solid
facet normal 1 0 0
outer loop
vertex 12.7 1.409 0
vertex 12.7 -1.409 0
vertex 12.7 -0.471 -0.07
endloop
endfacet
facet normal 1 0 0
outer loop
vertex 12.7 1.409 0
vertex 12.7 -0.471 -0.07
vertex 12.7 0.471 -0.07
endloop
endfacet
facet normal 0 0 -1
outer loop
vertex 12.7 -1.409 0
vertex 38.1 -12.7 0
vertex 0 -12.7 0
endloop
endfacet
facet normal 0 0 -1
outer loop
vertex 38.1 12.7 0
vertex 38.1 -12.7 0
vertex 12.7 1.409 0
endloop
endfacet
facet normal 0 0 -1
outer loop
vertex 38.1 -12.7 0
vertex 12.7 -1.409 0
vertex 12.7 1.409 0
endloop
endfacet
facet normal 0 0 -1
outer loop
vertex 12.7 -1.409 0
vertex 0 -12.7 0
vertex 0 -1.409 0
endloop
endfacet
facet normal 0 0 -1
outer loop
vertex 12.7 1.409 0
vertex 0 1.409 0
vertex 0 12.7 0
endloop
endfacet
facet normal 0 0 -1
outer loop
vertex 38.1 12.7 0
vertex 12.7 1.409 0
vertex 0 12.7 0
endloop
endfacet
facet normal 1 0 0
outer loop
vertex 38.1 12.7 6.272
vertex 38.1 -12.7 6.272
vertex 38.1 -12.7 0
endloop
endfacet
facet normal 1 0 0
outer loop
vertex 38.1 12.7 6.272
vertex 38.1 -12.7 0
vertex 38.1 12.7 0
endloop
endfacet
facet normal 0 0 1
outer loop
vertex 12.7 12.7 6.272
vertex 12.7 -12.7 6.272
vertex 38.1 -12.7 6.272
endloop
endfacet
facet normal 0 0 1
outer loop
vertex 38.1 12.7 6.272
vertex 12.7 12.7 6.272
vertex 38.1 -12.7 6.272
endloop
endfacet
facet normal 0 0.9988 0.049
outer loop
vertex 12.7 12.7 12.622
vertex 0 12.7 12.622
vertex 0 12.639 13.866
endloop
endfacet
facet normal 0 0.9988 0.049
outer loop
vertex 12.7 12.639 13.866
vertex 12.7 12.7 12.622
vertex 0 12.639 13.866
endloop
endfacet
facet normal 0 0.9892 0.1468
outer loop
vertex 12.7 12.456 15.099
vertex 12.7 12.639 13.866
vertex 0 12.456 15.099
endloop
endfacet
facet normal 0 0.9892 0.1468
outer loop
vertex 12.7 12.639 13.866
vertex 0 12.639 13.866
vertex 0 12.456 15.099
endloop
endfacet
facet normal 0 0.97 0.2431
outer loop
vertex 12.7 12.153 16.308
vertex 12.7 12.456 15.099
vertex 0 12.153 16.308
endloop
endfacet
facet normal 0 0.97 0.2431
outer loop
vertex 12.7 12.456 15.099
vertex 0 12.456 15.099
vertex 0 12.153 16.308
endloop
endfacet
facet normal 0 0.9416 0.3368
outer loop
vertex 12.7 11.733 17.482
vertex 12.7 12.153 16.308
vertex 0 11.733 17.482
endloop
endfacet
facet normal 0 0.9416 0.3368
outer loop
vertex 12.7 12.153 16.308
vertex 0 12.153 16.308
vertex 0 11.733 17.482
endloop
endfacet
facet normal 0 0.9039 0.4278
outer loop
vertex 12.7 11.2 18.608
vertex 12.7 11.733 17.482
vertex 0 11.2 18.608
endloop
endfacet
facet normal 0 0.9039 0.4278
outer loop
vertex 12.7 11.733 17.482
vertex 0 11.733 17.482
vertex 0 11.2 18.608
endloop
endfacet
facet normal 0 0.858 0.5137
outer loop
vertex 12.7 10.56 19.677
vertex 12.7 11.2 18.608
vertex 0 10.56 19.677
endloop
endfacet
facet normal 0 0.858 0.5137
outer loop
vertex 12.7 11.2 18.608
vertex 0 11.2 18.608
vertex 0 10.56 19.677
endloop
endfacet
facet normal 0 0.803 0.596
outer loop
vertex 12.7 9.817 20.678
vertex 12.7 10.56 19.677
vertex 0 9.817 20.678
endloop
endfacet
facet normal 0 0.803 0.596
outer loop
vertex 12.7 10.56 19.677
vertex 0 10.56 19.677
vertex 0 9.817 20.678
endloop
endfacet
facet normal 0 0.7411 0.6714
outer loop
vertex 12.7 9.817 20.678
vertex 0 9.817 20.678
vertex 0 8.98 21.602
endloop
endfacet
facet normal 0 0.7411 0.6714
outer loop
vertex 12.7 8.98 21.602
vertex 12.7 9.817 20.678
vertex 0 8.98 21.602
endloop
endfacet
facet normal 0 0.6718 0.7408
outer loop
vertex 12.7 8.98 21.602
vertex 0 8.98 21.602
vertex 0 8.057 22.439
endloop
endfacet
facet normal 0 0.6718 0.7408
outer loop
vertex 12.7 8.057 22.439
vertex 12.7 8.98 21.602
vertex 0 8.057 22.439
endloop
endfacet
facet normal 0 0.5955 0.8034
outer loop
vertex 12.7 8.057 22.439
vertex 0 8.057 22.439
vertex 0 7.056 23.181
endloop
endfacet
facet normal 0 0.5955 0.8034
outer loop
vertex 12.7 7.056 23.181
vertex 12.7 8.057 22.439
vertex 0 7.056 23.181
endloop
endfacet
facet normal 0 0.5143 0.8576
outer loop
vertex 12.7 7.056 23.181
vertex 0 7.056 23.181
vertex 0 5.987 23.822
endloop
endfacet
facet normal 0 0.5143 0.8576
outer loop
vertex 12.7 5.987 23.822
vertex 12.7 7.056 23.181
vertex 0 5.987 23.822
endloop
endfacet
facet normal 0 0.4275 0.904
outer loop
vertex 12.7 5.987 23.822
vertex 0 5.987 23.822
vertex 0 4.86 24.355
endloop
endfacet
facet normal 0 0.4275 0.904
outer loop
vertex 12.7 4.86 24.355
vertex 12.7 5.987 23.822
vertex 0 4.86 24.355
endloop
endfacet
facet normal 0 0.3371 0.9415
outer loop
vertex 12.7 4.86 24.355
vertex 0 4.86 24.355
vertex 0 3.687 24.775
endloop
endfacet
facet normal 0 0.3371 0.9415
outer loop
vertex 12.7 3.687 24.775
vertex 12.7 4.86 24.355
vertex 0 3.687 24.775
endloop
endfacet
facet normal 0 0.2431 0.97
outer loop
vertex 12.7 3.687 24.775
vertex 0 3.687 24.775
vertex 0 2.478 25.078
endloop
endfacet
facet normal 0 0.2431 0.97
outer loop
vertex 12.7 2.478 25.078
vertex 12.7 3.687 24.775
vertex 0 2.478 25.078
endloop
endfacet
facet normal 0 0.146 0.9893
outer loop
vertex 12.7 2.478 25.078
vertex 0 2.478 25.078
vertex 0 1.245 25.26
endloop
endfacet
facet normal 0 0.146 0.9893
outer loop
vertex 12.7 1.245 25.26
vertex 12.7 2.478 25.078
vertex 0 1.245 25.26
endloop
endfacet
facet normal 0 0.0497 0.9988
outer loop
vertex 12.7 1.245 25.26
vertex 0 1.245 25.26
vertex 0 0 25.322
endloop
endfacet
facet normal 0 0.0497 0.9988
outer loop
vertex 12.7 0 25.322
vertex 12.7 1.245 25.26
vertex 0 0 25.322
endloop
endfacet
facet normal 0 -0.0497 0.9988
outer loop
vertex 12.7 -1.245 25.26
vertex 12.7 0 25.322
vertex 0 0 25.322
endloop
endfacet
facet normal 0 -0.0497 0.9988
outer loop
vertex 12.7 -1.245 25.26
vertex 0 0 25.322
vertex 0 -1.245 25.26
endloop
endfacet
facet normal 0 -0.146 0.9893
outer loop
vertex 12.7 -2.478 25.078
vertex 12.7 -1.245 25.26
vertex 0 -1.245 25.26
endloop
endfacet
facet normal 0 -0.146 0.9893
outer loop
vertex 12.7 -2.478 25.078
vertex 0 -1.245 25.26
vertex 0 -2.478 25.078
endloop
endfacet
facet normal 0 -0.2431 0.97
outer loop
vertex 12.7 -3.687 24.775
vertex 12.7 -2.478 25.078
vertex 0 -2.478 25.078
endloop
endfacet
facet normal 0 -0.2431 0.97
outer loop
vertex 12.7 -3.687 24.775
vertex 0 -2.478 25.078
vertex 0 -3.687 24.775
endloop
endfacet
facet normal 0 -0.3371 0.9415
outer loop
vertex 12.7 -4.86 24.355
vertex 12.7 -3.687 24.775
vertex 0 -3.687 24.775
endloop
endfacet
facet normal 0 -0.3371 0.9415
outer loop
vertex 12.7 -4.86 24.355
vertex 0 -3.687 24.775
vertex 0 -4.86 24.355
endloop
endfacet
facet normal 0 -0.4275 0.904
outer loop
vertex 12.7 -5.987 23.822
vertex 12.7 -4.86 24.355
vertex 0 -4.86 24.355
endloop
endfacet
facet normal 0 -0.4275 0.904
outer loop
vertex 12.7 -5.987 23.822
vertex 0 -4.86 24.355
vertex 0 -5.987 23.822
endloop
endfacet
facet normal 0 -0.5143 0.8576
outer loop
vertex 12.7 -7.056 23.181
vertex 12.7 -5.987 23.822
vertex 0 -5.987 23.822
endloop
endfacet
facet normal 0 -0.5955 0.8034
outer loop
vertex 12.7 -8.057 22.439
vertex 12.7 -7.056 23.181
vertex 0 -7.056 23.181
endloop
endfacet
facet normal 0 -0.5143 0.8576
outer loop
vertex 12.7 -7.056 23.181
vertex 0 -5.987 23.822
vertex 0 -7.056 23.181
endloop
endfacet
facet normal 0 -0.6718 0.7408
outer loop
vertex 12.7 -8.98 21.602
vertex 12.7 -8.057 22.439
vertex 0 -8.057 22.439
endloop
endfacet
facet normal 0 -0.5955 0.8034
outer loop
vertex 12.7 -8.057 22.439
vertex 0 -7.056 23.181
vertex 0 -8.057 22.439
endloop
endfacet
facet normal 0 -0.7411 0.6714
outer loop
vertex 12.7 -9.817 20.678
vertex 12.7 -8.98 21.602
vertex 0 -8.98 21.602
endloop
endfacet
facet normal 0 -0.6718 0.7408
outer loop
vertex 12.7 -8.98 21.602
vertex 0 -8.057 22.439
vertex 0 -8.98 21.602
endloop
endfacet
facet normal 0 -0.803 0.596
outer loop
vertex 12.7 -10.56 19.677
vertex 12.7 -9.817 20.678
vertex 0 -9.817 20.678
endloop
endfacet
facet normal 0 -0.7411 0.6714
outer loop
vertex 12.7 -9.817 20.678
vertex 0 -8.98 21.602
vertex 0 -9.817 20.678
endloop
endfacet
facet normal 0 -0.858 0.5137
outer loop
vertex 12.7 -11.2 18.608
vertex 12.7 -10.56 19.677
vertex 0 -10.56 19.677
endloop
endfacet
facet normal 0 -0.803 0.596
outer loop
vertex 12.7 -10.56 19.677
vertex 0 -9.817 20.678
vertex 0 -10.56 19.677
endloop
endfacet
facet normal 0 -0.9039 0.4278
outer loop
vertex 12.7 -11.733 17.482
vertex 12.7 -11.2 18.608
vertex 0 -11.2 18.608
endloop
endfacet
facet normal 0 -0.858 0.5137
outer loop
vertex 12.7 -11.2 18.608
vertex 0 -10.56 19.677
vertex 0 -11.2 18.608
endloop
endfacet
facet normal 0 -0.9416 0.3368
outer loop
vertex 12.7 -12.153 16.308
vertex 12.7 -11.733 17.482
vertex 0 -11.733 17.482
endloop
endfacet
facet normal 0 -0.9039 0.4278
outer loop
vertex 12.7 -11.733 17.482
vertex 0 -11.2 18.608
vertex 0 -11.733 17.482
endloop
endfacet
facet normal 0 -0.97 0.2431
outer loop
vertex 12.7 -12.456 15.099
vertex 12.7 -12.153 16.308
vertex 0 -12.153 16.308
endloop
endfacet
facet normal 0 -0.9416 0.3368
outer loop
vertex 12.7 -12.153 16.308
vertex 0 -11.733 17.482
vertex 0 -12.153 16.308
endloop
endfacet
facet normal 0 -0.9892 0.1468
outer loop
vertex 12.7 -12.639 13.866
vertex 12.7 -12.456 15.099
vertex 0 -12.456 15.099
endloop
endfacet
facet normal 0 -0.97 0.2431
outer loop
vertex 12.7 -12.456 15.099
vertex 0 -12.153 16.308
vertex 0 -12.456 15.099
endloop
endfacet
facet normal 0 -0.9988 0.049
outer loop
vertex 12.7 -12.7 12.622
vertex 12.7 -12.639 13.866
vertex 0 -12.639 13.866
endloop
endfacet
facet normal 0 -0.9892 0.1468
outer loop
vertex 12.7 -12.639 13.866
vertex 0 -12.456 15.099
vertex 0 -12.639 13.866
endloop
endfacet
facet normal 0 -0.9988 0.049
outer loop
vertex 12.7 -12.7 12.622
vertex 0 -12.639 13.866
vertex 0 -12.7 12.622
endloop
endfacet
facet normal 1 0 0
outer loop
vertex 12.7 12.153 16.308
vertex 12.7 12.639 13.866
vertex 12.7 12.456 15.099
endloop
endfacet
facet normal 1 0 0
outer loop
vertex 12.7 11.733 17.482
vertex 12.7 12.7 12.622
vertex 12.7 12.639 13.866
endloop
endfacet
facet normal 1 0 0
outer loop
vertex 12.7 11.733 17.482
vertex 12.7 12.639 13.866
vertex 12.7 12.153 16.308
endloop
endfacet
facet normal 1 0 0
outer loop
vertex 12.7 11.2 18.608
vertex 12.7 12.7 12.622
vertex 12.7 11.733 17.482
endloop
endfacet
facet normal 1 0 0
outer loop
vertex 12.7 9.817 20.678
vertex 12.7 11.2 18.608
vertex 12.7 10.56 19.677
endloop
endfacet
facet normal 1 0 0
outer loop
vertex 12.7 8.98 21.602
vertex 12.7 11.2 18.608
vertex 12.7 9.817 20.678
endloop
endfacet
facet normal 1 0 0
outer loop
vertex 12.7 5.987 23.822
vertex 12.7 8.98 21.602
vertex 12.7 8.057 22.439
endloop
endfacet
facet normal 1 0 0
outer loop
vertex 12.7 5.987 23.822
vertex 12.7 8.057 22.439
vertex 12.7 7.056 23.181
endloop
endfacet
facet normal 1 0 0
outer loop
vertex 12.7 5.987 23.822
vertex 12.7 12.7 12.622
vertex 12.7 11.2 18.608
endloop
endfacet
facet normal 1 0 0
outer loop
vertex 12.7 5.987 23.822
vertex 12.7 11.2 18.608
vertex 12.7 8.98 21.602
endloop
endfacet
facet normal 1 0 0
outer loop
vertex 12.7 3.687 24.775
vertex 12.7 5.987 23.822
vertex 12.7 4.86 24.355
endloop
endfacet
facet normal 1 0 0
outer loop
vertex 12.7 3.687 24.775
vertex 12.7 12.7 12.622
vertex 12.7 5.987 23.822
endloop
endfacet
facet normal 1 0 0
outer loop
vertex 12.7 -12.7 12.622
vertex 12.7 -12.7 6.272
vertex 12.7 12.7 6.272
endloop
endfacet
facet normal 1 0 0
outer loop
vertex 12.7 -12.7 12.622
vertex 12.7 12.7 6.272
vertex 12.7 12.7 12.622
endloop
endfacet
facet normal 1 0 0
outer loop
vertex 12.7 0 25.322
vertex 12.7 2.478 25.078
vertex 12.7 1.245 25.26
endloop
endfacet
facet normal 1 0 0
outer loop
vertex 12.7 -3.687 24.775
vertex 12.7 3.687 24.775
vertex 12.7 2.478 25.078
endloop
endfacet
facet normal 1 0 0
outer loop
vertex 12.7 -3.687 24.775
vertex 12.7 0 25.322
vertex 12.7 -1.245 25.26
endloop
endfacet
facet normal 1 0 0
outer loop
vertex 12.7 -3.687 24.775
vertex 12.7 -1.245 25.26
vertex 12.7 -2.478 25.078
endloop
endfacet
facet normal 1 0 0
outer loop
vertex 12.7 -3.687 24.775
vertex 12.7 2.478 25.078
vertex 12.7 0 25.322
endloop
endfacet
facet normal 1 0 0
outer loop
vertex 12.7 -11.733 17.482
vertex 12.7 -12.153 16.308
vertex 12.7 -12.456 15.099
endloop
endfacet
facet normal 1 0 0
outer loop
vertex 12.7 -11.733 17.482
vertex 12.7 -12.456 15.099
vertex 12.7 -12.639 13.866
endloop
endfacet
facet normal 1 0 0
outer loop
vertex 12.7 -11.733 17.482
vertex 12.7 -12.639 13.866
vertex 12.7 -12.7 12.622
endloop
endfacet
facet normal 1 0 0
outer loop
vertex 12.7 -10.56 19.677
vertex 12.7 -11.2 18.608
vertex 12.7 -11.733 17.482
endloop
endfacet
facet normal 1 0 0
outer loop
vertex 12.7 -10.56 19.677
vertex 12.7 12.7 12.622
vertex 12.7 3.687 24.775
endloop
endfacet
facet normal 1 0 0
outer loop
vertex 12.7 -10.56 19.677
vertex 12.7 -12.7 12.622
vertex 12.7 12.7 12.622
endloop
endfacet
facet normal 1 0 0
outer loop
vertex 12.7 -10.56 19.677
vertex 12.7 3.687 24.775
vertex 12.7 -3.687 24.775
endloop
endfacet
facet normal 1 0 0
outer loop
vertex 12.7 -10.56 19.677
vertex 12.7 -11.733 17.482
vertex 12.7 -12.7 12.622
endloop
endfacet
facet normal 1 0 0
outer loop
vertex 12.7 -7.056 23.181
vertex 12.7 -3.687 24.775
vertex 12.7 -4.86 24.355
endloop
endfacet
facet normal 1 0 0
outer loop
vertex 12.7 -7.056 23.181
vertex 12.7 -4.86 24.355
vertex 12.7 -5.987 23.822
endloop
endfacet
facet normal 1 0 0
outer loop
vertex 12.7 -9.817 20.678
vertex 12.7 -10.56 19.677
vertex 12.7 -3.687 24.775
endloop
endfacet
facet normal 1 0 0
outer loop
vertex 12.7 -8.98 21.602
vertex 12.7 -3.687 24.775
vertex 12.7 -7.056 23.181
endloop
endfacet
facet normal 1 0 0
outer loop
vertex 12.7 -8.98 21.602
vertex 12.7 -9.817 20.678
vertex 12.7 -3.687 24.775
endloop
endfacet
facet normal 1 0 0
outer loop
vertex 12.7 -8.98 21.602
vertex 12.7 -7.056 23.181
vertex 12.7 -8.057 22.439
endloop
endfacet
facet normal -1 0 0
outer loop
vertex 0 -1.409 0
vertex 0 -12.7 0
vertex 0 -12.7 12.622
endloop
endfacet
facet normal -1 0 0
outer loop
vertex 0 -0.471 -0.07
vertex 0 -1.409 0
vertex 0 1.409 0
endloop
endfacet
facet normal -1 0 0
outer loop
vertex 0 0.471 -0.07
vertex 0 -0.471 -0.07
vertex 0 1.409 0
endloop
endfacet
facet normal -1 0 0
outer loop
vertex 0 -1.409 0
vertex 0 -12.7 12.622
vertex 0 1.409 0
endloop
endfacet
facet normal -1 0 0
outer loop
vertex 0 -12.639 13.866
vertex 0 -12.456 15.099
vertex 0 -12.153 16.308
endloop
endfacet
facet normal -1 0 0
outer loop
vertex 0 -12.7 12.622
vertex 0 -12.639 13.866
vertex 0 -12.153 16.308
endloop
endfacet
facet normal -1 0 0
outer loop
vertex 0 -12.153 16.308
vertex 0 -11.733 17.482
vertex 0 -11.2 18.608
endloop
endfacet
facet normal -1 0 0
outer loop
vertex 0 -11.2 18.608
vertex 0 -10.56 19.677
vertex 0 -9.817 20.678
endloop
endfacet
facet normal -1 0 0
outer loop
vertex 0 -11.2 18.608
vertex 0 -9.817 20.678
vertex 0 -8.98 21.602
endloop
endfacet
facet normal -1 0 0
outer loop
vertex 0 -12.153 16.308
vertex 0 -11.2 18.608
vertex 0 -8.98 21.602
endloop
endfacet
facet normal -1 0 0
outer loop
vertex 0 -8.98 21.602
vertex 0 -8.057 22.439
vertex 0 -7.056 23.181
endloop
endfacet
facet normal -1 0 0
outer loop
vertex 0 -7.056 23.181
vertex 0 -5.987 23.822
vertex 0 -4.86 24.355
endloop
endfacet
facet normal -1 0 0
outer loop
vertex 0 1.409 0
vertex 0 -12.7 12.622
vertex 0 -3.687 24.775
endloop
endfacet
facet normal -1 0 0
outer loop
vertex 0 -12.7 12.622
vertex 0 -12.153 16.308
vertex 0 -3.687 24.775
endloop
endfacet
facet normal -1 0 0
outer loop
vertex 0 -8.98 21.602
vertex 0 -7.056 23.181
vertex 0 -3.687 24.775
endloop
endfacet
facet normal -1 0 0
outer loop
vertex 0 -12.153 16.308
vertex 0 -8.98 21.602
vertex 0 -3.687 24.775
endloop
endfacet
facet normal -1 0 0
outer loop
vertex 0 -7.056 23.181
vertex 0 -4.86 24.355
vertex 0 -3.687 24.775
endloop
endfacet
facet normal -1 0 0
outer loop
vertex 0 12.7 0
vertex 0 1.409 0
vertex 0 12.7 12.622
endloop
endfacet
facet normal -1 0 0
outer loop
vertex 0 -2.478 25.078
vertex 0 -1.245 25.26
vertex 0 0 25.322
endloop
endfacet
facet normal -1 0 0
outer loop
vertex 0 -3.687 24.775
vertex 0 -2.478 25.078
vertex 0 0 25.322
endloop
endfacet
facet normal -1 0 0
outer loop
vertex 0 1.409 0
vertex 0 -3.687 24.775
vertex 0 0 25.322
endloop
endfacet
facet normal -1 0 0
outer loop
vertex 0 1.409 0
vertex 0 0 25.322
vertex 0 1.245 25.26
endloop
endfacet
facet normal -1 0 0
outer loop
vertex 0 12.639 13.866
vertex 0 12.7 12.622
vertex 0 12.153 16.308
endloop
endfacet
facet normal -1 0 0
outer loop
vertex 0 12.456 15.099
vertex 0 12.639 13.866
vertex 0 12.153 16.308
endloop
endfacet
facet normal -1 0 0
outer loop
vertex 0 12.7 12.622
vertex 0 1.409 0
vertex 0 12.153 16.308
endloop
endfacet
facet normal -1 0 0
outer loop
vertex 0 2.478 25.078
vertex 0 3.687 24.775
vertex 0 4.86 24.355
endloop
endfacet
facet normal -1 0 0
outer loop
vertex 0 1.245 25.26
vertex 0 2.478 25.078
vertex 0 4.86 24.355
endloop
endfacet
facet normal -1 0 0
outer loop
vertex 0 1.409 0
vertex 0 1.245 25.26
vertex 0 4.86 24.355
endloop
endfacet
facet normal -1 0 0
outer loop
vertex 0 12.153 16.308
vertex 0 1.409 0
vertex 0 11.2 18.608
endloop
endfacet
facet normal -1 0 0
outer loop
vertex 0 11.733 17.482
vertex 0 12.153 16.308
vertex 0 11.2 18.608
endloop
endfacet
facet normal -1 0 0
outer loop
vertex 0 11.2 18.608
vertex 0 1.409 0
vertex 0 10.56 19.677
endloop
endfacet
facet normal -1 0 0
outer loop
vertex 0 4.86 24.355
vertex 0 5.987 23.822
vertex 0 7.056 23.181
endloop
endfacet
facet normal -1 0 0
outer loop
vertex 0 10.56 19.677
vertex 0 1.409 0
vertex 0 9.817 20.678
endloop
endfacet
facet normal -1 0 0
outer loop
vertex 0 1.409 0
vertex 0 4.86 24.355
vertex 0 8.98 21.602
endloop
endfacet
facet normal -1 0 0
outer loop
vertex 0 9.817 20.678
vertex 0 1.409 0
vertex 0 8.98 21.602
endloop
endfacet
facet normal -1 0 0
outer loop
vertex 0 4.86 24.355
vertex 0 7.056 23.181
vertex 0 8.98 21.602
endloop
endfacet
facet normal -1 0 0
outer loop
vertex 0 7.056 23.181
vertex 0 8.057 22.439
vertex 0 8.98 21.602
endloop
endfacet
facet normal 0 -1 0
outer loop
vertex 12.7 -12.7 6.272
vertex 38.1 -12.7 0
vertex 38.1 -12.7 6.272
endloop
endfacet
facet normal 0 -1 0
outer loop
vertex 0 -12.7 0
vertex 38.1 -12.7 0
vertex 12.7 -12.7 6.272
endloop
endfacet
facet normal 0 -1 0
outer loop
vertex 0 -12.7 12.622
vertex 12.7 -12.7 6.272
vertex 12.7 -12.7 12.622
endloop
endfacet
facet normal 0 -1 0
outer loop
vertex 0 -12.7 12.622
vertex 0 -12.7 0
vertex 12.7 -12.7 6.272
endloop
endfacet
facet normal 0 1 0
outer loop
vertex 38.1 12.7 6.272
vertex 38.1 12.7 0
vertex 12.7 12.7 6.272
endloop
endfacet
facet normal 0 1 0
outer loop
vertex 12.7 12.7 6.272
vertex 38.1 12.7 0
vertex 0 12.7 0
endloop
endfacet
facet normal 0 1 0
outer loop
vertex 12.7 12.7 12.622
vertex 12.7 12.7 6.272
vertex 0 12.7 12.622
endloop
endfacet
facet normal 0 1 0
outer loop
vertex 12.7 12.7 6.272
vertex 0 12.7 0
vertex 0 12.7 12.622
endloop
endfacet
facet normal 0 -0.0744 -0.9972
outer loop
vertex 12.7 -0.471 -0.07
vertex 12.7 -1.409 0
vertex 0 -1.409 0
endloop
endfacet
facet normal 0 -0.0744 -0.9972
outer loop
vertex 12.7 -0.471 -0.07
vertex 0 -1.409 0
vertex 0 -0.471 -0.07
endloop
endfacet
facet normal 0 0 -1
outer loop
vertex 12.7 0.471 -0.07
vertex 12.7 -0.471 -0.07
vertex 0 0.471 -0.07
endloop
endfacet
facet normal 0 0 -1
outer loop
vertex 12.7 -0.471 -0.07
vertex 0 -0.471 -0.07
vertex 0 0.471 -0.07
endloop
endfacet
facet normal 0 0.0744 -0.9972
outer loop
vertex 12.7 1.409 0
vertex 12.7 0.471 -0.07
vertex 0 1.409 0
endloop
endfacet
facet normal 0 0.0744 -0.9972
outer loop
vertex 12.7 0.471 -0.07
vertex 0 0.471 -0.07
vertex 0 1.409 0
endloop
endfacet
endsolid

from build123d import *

# Parameters (mm, degrees)
F0_R     = 12.7
F1_DEPTH = 12.7
F2_W     = 25.4
F2_H     = 12.621605
F3_DEPTH = 38.1
F4_W     = 25.4
F4_H     = 6.35
F5_DEPTH = 51.562


with BuildPart() as f1:
    # F0 (on Right) → F1 (new body)
    with BuildSketch(Plane.YZ):
        with Locations((0, 12.621605)):
            Circle(F0_R)
    extrude(amount=F1_DEPTH)

    # F2 (on Right) → F3 (join)
    with BuildSketch(Plane.YZ):
        with Locations((0, 6.310802)):
            Rectangle(F2_W, F2_H)
    extrude(amount=F3_DEPTH)

    # F4 (on Front) → F5 (cut, symmetric)
    with BuildSketch(Plane.XZ):
        with Locations((25.4, 9.446605)):
            Rectangle(F4_W, F4_H)
    extrude(amount=F5_DEPTH, both=True, mode=Mode.SUBTRACT)


solid = f1.part
